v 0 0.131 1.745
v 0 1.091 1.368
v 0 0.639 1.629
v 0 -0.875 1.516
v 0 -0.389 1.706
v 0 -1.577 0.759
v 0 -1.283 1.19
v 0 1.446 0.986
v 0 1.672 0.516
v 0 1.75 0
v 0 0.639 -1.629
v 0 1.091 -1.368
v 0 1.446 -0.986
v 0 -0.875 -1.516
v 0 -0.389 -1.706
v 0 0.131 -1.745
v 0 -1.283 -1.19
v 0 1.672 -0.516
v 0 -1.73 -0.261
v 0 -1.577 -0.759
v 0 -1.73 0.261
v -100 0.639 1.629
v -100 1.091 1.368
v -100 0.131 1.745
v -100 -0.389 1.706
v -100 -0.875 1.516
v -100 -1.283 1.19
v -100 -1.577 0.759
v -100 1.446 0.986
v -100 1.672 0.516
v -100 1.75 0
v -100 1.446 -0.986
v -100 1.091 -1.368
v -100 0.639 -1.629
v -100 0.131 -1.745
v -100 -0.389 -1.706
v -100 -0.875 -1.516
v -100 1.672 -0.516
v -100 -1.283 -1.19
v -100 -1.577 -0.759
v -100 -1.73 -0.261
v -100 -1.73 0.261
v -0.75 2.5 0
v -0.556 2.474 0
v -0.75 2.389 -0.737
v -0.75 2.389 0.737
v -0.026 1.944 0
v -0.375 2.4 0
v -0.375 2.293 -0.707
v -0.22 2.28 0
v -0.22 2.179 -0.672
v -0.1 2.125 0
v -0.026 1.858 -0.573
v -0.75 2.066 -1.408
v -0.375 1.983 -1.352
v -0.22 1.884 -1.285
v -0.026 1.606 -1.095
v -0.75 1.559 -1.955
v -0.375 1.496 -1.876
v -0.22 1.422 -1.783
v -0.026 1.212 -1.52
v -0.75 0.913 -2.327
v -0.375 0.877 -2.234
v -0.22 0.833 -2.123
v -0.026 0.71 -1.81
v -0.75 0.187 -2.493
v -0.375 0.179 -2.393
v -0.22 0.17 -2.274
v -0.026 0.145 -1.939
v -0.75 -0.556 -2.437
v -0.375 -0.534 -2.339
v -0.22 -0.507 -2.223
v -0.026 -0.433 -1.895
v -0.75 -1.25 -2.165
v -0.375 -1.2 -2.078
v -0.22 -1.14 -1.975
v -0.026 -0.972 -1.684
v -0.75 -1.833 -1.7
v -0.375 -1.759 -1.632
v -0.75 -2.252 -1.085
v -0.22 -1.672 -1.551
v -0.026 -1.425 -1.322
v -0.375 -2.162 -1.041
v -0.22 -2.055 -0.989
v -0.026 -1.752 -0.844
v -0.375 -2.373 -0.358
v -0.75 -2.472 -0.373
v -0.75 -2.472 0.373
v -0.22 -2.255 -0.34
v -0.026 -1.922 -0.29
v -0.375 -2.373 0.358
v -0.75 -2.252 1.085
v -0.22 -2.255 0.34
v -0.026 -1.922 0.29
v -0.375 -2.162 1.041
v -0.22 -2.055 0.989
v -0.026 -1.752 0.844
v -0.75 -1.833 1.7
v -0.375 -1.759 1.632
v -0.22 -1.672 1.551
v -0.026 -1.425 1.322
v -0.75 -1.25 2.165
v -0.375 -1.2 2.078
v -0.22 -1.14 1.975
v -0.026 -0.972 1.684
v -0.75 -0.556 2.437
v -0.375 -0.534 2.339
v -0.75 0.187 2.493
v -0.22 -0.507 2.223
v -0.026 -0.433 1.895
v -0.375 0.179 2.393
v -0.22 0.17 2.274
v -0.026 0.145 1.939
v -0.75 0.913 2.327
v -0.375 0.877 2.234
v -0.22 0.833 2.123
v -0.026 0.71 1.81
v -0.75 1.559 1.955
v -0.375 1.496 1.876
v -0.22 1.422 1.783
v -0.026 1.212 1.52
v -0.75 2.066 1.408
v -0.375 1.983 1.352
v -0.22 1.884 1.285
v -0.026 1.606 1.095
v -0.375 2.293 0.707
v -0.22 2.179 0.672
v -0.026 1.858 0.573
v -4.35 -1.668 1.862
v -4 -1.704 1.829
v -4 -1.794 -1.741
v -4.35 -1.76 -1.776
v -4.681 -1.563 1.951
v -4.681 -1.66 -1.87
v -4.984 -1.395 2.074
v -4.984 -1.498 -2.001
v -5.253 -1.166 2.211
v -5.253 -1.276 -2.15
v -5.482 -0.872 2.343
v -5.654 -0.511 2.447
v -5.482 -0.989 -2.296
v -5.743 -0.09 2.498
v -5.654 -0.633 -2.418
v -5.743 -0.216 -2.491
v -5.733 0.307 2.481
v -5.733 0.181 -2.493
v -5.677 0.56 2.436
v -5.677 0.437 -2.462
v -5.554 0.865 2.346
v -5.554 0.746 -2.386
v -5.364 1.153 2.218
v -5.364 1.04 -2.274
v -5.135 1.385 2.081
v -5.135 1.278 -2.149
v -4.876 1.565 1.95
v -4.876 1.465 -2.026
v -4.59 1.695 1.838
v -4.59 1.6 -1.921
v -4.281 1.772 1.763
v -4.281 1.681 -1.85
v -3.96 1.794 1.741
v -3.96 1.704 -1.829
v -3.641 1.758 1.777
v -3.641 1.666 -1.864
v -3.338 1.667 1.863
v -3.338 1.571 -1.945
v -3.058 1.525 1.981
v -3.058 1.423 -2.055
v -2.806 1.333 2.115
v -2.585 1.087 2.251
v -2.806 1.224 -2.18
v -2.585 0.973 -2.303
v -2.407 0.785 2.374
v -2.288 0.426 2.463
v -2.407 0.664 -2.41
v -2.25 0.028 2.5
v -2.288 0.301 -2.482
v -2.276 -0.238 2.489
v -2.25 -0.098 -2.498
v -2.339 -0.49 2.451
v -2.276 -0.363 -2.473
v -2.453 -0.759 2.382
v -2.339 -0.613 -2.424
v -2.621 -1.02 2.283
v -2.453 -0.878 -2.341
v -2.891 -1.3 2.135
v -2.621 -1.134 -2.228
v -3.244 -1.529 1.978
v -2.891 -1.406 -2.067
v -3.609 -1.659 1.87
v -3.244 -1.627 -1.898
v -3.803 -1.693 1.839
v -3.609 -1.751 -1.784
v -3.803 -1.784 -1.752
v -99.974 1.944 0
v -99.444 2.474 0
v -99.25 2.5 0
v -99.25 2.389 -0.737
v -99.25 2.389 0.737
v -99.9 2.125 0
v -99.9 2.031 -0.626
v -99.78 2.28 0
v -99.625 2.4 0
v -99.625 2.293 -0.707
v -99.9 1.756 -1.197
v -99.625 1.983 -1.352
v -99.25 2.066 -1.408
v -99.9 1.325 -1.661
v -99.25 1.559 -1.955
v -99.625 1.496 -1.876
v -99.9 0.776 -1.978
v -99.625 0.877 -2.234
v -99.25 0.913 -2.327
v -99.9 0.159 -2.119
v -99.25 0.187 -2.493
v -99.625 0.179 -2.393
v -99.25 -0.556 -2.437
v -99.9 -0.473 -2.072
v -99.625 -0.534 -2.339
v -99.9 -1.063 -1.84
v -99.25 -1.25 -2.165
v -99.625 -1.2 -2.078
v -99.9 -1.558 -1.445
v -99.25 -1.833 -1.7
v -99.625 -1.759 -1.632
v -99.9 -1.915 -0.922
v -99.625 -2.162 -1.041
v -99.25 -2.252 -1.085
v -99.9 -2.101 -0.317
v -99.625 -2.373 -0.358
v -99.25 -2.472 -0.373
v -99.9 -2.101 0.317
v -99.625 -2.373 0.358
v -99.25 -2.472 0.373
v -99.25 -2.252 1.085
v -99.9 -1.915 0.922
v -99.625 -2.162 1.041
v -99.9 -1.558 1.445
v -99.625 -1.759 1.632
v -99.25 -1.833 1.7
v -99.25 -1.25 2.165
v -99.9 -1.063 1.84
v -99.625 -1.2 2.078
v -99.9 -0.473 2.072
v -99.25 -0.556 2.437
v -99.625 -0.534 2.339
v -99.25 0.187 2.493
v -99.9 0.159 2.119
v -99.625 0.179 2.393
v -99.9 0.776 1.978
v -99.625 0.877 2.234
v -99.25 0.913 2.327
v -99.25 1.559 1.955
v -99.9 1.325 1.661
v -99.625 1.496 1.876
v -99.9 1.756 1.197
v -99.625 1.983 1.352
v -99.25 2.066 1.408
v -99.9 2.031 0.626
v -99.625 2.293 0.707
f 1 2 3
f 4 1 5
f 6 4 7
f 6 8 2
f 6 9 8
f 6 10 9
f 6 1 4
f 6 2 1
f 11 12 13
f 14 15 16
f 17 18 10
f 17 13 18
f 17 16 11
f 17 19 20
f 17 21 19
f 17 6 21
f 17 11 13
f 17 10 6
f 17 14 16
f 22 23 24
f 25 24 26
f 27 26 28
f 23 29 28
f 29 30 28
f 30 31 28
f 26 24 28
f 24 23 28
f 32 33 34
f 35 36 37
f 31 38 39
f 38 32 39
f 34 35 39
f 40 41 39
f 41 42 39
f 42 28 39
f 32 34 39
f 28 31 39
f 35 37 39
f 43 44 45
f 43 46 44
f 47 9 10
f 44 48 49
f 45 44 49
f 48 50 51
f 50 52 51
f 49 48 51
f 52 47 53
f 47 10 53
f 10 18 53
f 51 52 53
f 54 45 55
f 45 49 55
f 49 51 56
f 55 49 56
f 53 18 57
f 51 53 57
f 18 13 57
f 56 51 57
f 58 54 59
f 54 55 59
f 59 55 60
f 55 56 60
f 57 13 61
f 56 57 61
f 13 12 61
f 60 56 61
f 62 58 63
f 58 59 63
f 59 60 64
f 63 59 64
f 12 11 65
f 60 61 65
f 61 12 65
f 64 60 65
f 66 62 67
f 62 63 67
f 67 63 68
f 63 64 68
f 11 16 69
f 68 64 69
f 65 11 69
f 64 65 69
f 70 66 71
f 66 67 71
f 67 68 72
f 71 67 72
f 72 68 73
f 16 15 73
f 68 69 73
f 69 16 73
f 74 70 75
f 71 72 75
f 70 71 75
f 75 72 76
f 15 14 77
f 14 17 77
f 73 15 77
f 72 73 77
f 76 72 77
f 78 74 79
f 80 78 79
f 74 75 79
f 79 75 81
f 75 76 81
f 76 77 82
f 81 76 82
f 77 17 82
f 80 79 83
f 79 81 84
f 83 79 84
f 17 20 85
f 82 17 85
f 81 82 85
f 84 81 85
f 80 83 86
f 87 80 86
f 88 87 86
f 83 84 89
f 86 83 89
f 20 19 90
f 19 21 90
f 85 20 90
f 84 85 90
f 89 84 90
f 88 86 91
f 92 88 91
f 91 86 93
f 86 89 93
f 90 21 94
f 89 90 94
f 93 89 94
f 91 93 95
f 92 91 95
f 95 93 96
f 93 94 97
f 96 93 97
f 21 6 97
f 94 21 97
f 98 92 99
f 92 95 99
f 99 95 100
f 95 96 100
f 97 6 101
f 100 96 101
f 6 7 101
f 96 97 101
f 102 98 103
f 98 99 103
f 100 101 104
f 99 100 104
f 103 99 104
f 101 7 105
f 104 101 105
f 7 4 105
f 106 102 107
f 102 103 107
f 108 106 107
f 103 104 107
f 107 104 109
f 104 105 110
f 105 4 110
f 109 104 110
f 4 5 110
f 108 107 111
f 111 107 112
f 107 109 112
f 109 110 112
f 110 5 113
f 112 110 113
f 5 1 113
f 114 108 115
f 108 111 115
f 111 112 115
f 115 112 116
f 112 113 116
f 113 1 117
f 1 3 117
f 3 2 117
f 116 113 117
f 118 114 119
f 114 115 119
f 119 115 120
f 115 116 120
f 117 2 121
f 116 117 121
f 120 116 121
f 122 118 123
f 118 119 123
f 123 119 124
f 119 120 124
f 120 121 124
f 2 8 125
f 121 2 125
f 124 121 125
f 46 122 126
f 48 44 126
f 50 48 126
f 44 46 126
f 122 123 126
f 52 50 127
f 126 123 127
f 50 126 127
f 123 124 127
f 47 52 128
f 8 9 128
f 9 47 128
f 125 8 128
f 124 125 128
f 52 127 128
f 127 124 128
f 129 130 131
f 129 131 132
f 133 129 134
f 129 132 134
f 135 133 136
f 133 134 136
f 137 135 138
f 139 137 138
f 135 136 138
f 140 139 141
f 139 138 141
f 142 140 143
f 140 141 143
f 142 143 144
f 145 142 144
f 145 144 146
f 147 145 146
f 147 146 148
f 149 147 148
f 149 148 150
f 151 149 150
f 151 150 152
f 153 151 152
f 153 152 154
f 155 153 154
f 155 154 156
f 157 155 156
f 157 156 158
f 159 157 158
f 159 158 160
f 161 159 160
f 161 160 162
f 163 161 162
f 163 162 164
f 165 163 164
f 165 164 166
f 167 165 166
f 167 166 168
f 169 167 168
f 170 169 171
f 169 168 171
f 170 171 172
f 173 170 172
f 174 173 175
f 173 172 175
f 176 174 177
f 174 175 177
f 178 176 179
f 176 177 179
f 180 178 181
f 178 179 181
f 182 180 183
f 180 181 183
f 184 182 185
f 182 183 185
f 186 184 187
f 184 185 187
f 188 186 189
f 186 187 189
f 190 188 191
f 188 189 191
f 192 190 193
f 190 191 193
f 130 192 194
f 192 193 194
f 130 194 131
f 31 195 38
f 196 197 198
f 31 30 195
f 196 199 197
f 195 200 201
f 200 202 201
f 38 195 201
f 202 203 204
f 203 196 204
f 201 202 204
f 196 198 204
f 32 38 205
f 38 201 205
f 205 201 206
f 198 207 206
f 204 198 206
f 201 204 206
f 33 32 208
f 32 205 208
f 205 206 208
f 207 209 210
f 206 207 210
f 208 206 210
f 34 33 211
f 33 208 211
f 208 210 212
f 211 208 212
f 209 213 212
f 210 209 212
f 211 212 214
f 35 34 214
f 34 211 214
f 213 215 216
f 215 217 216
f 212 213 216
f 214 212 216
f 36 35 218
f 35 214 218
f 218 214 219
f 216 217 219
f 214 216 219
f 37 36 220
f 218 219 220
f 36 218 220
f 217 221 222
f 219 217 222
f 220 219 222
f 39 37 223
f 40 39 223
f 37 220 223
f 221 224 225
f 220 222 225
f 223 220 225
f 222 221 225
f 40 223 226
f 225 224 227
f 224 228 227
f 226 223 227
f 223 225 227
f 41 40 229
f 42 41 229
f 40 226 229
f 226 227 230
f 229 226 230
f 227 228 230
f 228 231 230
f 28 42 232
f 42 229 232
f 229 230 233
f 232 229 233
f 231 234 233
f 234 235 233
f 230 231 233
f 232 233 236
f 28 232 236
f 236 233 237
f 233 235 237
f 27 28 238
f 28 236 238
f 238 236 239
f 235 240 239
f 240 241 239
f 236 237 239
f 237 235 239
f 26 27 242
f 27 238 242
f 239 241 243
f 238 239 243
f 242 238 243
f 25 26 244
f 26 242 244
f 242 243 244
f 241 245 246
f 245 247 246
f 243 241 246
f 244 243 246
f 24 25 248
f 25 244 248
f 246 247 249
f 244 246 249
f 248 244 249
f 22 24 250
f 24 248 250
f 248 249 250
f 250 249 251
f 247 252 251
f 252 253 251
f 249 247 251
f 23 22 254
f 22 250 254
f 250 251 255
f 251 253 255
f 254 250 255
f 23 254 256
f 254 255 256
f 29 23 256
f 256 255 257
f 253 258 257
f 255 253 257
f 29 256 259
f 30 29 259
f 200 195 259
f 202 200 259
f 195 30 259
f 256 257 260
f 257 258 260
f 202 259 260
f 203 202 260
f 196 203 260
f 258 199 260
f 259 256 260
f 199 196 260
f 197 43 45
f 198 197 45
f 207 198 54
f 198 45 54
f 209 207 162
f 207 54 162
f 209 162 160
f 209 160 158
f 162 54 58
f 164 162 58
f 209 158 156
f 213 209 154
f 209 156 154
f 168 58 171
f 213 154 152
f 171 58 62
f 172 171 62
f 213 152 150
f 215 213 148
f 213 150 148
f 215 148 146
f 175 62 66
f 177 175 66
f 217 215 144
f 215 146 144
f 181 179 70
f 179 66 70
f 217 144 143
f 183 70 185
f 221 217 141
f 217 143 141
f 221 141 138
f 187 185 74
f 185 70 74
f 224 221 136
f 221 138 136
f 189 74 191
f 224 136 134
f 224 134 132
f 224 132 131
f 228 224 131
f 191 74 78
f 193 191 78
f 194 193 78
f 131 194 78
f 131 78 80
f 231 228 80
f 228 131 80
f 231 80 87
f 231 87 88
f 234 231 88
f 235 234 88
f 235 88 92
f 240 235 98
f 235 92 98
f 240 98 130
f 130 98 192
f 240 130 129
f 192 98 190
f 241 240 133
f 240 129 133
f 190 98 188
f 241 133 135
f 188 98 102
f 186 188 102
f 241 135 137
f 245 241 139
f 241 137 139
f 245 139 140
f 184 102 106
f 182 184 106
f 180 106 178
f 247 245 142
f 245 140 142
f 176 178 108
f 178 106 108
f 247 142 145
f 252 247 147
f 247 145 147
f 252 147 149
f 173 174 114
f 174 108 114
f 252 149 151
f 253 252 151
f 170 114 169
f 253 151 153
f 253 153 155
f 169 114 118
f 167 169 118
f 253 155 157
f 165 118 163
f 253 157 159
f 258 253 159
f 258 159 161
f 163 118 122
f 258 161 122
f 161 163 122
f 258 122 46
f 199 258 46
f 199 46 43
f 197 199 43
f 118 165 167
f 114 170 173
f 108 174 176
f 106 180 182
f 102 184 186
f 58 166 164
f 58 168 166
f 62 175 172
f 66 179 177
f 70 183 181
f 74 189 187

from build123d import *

# Parameters (mm, degrees)
SKIZZE1_W                        = 100
SKIZZE1_H                        = 2.5
VERRUNDUNG1_R                    = 0.75
VERRUNDUNG2_R                    = 0.75
F_3_5_3_5_DURCHMESSER_BOHRUNG1_D = 3.5


with BuildPart() as part:
    # Skizze1 → Rotation1 (revolve)
    with BuildSketch(Plane.XY):
        with Locations((-50, 1.25)):
            Rectangle(SKIZZE1_W, SKIZZE1_H)
    revolve(axis=Axis((0, 0, 0), (-1, 0, 0)))

    # Verrundung1
    verrundung1_edges = [part.edges().sort_by_distance(p)[0] for p in [
        (-100, -2.5, 0),
    ]]
    fillet(verrundung1_edges, radius=VERRUNDUNG1_R)

    # Verrundung2
    verrundung2_edges = [part.edges().sort_by_distance(p)[0] for p in [
        (0, -2.5, 0),
    ]]
    fillet(verrundung2_edges, radius=VERRUNDUNG2_R)

    # Ø3.5 (3.5) Durchmesser Bohrung1 (through all)
    with Locations(Plane(origin=(-4, 0.063040866, 2.499205043), x_dir=(0, 0.999682017384, -0.025216346285), z_dir=(0, 0.025216346285, 0.999682017384))):
        with Locations((0, 0)):
            Hole(F_3_5_3_5_DURCHMESSER_BOHRUNG1_D / 2)


solid = part.part
